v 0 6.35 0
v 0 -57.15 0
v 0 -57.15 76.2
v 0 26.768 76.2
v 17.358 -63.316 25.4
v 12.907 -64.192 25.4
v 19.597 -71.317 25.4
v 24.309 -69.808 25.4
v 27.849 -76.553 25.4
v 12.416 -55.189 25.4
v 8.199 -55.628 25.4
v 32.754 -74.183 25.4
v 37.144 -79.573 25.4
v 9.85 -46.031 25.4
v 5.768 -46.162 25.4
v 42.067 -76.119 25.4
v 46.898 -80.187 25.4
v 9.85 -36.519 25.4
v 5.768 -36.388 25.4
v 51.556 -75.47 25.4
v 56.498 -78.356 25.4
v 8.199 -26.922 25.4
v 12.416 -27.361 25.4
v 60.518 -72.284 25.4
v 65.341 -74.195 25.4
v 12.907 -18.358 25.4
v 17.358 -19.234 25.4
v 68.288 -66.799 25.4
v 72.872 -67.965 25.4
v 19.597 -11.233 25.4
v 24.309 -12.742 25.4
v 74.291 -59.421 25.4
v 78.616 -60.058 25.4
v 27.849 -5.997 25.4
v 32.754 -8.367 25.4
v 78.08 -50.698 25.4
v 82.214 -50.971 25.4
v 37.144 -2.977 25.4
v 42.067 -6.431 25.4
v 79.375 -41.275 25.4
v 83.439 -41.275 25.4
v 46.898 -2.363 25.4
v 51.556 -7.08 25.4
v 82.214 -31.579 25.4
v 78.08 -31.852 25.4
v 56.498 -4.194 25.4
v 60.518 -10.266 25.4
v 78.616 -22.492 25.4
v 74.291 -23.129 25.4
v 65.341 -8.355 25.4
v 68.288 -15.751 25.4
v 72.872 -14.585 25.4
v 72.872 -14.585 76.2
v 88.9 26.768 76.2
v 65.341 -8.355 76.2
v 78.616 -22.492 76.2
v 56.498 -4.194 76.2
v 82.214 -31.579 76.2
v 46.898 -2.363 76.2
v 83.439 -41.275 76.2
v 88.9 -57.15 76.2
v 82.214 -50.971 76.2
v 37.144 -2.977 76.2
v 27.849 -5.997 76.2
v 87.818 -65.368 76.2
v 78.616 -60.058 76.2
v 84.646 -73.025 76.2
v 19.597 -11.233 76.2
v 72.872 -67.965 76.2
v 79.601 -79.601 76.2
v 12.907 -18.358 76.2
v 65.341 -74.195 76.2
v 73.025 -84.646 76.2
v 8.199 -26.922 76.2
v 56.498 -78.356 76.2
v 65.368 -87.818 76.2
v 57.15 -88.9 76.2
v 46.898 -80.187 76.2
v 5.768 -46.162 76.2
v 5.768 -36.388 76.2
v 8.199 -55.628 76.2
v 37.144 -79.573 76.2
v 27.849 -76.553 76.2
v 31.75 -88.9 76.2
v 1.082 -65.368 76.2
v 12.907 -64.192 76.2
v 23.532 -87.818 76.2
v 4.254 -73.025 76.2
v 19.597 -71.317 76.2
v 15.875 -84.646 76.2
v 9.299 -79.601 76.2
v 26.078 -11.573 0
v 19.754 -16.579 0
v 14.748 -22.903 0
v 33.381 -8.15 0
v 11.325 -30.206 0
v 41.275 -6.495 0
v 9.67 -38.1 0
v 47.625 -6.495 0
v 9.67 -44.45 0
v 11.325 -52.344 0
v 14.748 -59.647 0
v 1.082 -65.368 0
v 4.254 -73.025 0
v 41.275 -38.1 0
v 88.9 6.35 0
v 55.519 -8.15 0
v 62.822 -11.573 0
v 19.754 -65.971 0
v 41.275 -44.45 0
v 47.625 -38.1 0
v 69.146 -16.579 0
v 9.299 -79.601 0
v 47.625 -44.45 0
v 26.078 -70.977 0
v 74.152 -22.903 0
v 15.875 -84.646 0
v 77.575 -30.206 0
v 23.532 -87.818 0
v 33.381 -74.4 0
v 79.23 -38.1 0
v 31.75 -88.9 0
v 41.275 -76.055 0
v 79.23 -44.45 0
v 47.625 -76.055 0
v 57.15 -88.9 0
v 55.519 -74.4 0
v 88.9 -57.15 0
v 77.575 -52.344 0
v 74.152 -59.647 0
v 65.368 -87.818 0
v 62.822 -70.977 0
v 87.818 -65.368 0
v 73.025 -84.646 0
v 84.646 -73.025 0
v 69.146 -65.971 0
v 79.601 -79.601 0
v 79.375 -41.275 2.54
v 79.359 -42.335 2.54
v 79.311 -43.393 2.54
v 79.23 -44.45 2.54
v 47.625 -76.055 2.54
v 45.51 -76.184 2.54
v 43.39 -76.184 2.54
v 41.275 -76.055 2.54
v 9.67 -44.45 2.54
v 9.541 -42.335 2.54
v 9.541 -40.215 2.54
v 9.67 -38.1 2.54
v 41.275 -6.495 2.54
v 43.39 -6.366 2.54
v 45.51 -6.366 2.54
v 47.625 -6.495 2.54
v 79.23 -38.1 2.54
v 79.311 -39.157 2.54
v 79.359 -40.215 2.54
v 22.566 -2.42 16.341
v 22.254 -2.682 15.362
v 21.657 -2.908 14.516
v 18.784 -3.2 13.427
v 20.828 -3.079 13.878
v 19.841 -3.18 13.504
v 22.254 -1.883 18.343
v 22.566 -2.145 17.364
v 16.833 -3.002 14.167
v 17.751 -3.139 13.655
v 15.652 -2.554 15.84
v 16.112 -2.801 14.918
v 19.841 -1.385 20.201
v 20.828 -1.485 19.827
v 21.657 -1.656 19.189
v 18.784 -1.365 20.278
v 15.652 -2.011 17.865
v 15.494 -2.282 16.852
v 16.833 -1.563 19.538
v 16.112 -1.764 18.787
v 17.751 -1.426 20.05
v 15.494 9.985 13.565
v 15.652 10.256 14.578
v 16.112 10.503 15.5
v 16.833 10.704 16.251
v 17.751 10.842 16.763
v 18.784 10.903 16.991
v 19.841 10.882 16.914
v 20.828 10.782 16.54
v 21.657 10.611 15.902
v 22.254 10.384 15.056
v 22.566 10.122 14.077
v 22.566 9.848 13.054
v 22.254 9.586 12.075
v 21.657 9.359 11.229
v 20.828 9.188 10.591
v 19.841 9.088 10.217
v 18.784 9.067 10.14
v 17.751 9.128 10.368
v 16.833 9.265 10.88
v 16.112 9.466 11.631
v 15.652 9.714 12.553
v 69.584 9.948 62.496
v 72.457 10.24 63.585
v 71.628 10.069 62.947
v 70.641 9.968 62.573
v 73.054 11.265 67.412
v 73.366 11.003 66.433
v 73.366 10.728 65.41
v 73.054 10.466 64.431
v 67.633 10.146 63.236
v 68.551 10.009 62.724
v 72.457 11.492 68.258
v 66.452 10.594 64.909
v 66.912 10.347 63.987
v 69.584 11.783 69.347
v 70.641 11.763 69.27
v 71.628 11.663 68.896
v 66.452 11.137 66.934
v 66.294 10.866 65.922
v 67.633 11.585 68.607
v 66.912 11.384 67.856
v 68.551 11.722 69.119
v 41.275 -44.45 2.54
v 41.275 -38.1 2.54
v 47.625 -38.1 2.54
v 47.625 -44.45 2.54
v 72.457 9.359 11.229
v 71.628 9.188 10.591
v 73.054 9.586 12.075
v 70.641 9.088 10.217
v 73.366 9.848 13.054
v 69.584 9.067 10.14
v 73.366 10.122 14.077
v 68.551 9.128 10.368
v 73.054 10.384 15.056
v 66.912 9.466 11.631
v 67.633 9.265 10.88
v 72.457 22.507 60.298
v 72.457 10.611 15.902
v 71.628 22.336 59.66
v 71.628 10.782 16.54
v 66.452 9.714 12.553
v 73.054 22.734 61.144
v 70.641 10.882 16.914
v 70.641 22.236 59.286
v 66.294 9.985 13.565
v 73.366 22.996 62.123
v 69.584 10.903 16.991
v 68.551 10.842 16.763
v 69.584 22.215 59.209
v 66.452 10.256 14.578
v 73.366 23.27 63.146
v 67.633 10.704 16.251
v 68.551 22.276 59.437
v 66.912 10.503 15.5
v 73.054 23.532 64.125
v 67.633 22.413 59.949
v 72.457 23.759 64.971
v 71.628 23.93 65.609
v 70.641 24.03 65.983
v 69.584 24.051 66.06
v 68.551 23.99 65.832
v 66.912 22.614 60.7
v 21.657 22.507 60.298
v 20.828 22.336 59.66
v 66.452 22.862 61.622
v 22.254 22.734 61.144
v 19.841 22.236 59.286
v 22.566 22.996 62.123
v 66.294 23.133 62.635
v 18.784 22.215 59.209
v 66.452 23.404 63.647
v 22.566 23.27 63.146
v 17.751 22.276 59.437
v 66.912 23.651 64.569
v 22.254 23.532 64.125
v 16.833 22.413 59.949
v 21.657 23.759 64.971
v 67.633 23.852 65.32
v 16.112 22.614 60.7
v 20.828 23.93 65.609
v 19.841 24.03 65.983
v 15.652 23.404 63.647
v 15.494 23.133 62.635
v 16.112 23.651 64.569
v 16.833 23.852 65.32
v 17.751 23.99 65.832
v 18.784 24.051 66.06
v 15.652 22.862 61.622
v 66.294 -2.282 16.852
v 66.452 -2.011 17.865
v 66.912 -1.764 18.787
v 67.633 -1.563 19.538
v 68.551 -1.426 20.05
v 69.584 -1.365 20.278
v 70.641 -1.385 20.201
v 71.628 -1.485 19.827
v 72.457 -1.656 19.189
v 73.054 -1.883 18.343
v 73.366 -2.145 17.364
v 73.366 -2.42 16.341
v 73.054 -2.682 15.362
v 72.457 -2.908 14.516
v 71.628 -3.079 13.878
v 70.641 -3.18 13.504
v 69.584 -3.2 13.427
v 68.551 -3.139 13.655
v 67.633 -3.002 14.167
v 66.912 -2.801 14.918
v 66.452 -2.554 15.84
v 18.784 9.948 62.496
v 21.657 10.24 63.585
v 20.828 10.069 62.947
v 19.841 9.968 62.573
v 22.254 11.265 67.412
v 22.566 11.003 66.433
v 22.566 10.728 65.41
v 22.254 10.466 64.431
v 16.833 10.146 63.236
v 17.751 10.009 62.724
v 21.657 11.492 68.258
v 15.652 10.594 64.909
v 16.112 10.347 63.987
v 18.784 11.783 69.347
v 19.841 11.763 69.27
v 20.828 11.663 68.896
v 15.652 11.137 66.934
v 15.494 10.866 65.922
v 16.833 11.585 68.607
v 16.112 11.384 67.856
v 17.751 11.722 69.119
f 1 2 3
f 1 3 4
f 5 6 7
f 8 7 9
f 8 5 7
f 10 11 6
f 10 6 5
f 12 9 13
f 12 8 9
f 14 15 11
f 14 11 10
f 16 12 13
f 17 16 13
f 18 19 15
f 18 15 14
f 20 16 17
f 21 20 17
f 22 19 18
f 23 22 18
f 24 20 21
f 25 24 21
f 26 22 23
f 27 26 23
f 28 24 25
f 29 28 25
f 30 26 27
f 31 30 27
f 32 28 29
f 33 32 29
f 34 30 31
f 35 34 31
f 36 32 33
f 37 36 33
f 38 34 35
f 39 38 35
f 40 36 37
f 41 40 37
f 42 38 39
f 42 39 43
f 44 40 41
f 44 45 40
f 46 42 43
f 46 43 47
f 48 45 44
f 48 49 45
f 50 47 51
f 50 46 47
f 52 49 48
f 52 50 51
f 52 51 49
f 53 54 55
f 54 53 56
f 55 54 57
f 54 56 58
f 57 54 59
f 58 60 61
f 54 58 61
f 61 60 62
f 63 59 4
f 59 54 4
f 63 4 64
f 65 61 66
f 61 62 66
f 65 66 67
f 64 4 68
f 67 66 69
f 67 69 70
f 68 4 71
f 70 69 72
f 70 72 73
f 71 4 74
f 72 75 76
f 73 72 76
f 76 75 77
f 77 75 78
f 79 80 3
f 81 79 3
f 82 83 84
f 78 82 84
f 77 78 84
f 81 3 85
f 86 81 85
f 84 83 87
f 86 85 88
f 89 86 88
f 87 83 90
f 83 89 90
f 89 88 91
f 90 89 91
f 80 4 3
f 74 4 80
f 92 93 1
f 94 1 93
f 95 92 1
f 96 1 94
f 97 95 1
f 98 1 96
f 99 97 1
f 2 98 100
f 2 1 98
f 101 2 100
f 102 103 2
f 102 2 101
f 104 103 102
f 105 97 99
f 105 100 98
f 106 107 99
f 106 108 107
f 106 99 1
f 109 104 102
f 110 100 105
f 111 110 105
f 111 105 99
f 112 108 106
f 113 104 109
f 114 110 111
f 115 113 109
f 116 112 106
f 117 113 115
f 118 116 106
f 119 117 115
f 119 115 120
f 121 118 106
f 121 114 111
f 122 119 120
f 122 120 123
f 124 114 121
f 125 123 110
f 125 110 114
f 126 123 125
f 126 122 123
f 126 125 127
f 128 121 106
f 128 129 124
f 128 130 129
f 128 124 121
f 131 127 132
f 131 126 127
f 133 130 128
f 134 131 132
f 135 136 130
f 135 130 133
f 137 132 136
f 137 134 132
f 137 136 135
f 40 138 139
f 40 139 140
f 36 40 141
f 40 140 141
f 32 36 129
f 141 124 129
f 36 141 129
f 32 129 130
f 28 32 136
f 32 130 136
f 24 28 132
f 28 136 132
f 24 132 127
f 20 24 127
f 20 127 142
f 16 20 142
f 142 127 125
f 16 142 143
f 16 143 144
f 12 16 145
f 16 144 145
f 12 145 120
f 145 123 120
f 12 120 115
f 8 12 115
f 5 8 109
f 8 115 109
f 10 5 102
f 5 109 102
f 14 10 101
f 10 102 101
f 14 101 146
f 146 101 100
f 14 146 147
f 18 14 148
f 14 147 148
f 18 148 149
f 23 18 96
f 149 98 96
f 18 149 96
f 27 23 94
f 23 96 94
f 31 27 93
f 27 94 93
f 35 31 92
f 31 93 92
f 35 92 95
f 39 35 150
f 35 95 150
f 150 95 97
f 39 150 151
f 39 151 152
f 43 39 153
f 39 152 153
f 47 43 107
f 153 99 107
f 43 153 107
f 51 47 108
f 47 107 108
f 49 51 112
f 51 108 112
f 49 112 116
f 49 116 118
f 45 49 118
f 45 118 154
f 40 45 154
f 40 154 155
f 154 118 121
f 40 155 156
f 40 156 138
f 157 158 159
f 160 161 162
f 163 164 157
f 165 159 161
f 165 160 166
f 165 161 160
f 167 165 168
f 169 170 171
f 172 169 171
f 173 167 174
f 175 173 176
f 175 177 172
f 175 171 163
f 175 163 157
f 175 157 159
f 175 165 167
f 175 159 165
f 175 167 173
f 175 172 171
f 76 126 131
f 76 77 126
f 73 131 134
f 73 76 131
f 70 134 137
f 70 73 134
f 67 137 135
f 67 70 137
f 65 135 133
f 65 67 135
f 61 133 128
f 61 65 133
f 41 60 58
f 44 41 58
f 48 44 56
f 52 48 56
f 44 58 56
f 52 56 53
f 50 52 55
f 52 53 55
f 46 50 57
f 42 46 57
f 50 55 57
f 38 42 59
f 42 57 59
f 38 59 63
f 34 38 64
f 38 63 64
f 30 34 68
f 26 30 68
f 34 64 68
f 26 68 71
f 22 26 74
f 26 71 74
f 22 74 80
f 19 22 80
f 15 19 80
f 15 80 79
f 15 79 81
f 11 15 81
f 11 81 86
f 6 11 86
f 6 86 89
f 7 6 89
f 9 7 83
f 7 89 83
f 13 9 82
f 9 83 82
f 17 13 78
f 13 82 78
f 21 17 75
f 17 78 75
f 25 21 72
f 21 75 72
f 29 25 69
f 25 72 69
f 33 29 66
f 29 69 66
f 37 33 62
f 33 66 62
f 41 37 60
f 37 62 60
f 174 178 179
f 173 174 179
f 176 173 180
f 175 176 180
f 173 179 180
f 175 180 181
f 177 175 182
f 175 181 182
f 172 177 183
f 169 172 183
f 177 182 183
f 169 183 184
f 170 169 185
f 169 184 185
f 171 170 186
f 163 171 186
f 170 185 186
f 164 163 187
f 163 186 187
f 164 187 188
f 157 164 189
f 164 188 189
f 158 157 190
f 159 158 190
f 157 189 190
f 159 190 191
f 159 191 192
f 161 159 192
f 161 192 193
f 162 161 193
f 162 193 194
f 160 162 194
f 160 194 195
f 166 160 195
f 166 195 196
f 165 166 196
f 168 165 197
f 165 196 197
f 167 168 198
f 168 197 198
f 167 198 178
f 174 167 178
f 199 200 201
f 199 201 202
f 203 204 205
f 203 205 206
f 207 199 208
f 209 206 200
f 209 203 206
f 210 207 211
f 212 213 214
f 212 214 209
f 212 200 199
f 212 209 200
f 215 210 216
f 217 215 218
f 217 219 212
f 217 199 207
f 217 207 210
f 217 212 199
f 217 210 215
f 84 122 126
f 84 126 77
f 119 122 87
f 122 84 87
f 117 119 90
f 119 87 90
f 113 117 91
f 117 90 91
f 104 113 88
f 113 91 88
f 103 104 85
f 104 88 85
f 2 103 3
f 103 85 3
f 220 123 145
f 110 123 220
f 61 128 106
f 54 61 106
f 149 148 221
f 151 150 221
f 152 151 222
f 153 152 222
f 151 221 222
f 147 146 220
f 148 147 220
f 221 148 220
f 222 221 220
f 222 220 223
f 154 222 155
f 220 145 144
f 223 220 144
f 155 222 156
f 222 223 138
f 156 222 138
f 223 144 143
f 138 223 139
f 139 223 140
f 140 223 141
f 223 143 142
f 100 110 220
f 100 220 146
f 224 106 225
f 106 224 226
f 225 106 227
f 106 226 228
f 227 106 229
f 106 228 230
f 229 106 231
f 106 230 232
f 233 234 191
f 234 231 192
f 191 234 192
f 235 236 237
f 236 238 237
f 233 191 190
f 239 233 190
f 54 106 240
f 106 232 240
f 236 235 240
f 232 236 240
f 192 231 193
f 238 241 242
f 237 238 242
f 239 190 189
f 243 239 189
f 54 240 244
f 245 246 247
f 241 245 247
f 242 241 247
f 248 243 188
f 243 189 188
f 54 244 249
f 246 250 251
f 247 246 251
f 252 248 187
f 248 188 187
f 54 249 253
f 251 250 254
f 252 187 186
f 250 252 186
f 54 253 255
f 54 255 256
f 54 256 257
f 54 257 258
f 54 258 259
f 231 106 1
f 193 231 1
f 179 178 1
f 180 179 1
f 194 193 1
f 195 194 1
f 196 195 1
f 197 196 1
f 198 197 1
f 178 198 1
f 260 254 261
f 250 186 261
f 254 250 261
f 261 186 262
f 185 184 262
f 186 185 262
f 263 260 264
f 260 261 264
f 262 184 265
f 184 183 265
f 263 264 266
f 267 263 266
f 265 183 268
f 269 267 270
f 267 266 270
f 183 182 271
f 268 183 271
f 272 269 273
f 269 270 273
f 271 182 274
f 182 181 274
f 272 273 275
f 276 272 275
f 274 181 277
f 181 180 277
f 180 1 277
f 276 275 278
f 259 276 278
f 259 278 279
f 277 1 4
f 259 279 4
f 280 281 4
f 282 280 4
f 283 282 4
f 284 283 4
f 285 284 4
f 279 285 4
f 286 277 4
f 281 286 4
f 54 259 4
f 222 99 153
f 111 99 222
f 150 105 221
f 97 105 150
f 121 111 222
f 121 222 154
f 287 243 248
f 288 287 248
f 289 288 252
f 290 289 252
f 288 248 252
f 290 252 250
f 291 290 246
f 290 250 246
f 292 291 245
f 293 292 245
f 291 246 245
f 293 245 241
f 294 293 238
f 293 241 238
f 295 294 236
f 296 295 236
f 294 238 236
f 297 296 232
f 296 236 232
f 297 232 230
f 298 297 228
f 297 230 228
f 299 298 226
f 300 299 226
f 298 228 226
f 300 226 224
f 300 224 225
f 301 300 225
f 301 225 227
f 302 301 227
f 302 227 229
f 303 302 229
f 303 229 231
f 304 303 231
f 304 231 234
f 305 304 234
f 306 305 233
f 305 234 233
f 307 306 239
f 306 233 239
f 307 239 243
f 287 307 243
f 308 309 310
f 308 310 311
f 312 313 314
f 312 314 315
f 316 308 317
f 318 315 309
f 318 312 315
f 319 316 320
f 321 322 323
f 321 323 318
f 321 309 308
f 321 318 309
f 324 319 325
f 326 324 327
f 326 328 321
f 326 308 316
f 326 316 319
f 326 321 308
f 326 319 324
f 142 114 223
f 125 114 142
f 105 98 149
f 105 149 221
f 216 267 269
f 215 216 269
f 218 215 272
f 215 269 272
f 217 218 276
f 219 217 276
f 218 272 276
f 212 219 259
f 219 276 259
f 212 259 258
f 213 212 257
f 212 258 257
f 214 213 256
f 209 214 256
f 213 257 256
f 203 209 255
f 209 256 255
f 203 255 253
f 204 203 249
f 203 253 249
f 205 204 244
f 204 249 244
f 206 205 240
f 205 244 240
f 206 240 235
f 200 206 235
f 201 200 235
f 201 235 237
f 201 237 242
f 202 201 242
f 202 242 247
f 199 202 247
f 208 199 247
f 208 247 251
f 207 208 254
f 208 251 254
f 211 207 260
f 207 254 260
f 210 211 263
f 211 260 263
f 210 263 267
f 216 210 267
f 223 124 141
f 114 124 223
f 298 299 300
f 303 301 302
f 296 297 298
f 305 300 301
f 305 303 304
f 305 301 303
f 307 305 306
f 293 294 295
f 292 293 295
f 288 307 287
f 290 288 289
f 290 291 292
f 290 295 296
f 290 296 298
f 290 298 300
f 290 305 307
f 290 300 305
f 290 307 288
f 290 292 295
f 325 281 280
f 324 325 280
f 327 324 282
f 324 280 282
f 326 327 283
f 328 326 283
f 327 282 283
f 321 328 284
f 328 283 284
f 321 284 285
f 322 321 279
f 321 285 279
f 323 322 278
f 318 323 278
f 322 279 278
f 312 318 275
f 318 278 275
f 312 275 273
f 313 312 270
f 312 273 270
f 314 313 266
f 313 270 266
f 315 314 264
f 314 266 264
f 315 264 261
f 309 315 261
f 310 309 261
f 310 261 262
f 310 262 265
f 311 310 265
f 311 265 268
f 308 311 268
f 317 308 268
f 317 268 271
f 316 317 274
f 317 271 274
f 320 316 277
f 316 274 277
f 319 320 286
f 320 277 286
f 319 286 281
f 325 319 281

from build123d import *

# Parameters (mm, degrees)
F0_W     = 88.9
F0_H     = 76.2
F1_DEPTH = 88.9
F2_R     = 34.925
F3_DEPTH = 25.4
F4_R     = 38.989
F5_DEPTH = 50.8
F6_W     = 6.35
F6_H     = 6.35
F7_DEPTH = 2.54
F8_R     = 3.556
F9_DEPTH = 12.7
F10_R    = 31.75


with BuildPart() as f1:
    # F0 (on Right) → F1 (new body)
    with BuildSketch(Plane.YZ):
        with Locations((-44.45, 38.1)):
            Rectangle(F0_W, F0_H)
        Polygon((0, 76.2), (0, 0), (6.35, 0), (26.7677284633, 76.2), align=None)
    extrude(amount=F1_DEPTH)

    # F2 (on face) → F3 (cut)
    with BuildSketch(Plane(origin=(0, 0, 0), x_dir=(1, 0, 0), z_dir=(0, 0, -1))):
        with Locations((44.45, 41.275)):
            Circle(F2_R)
    extrude(amount=-F3_DEPTH, mode=Mode.SUBTRACT)

    # F4 (on face) → F5 (cut)
    with BuildSketch(Plane.XY.offset(76.2)):
        with Locations((44.45, -41.275)):
            Circle(F4_R)
    extrude(amount=-F5_DEPTH, mode=Mode.SUBTRACT)

    # F6 (on face) → F7 (join)
    with BuildSketch(Plane(origin=(0, 0, 0), x_dir=(1, 0, 0), z_dir=(0, 0, -1))):
        with BuildLine():
            Line((79.2303824016, 44.45), (47.625, 44.45))
            Line((47.625, 44.45), (47.625, 38.1))
            Line((47.625, 38.1), (79.2303824016, 38.1))
            ThreePointArc((79.2303824016, 38.1), (79.3388268675, 39.6858540619), (79.375, 41.275))
            ThreePointArc((79.375, 41.275), (79.3388268675, 42.8641459381), (79.2303824016, 44.45))
        make_face()
        with BuildLine():
            Line((41.275, 76.0553824016), (41.275, 44.45))
            Line((41.275, 44.45), (47.625, 44.45))
            Line((47.625, 44.45), (47.625, 76.0553824016))
            ThreePointArc((47.625, 76.0553824016), (44.45, 76.2), (41.275, 76.0553824016))
        make_face()
        with BuildLine():
            Line((41.275, 44.45), (9.6696175984, 44.45))
            ThreePointArc((9.6696175984, 44.45), (9.525, 41.275), (9.6696175984, 38.1))
            Line((9.6696175984, 38.1), (41.275, 38.1))
            Line((41.275, 38.1), (41.275, 44.45))
        make_face()
        with Locations((44.45, 41.275)):
            Rectangle(F6_W, F6_H)
        with BuildLine():
            Line((47.625, 38.1), (41.275, 38.1))
            Line((41.275, 38.1), (41.275, 6.4946175984))
            ThreePointArc((41.275, 6.4946175984), (44.45, 6.35), (47.625, 6.4946175984))
            Line((47.625, 6.4946175984), (47.625, 38.1))
        make_face()
    extrude(amount=-F7_DEPTH)

    # F8 (on face) → F9 (cut)
    with BuildSketch(Plane(origin=(0, 5.924630657, -1.5875), x_dir=(-1, 0, 0), z_dir=(0, 0.9659258263, -0.2588190451))):
        with Locations((-69.85, 66.48752341)):
            Circle(F8_R)
        with Locations((-19.05, 66.48752341)):
            Circle(F8_R)
        with Locations((-69.85, 15.68752341)):
            Circle(F8_R)
        with Locations((-19.05, 15.68752341)):
            Circle(F8_R)
    extrude(amount=-F9_DEPTH, mode=Mode.SUBTRACT)

    # F10
    f10_edges = [f1.edges().sort_by_distance(p)[0] for p in [
        (0, -88.9, 38.1),
        (88.9, -88.9, 38.1),
    ]]
    fillet(f10_edges, radius=F10_R)


solid = f1.part
